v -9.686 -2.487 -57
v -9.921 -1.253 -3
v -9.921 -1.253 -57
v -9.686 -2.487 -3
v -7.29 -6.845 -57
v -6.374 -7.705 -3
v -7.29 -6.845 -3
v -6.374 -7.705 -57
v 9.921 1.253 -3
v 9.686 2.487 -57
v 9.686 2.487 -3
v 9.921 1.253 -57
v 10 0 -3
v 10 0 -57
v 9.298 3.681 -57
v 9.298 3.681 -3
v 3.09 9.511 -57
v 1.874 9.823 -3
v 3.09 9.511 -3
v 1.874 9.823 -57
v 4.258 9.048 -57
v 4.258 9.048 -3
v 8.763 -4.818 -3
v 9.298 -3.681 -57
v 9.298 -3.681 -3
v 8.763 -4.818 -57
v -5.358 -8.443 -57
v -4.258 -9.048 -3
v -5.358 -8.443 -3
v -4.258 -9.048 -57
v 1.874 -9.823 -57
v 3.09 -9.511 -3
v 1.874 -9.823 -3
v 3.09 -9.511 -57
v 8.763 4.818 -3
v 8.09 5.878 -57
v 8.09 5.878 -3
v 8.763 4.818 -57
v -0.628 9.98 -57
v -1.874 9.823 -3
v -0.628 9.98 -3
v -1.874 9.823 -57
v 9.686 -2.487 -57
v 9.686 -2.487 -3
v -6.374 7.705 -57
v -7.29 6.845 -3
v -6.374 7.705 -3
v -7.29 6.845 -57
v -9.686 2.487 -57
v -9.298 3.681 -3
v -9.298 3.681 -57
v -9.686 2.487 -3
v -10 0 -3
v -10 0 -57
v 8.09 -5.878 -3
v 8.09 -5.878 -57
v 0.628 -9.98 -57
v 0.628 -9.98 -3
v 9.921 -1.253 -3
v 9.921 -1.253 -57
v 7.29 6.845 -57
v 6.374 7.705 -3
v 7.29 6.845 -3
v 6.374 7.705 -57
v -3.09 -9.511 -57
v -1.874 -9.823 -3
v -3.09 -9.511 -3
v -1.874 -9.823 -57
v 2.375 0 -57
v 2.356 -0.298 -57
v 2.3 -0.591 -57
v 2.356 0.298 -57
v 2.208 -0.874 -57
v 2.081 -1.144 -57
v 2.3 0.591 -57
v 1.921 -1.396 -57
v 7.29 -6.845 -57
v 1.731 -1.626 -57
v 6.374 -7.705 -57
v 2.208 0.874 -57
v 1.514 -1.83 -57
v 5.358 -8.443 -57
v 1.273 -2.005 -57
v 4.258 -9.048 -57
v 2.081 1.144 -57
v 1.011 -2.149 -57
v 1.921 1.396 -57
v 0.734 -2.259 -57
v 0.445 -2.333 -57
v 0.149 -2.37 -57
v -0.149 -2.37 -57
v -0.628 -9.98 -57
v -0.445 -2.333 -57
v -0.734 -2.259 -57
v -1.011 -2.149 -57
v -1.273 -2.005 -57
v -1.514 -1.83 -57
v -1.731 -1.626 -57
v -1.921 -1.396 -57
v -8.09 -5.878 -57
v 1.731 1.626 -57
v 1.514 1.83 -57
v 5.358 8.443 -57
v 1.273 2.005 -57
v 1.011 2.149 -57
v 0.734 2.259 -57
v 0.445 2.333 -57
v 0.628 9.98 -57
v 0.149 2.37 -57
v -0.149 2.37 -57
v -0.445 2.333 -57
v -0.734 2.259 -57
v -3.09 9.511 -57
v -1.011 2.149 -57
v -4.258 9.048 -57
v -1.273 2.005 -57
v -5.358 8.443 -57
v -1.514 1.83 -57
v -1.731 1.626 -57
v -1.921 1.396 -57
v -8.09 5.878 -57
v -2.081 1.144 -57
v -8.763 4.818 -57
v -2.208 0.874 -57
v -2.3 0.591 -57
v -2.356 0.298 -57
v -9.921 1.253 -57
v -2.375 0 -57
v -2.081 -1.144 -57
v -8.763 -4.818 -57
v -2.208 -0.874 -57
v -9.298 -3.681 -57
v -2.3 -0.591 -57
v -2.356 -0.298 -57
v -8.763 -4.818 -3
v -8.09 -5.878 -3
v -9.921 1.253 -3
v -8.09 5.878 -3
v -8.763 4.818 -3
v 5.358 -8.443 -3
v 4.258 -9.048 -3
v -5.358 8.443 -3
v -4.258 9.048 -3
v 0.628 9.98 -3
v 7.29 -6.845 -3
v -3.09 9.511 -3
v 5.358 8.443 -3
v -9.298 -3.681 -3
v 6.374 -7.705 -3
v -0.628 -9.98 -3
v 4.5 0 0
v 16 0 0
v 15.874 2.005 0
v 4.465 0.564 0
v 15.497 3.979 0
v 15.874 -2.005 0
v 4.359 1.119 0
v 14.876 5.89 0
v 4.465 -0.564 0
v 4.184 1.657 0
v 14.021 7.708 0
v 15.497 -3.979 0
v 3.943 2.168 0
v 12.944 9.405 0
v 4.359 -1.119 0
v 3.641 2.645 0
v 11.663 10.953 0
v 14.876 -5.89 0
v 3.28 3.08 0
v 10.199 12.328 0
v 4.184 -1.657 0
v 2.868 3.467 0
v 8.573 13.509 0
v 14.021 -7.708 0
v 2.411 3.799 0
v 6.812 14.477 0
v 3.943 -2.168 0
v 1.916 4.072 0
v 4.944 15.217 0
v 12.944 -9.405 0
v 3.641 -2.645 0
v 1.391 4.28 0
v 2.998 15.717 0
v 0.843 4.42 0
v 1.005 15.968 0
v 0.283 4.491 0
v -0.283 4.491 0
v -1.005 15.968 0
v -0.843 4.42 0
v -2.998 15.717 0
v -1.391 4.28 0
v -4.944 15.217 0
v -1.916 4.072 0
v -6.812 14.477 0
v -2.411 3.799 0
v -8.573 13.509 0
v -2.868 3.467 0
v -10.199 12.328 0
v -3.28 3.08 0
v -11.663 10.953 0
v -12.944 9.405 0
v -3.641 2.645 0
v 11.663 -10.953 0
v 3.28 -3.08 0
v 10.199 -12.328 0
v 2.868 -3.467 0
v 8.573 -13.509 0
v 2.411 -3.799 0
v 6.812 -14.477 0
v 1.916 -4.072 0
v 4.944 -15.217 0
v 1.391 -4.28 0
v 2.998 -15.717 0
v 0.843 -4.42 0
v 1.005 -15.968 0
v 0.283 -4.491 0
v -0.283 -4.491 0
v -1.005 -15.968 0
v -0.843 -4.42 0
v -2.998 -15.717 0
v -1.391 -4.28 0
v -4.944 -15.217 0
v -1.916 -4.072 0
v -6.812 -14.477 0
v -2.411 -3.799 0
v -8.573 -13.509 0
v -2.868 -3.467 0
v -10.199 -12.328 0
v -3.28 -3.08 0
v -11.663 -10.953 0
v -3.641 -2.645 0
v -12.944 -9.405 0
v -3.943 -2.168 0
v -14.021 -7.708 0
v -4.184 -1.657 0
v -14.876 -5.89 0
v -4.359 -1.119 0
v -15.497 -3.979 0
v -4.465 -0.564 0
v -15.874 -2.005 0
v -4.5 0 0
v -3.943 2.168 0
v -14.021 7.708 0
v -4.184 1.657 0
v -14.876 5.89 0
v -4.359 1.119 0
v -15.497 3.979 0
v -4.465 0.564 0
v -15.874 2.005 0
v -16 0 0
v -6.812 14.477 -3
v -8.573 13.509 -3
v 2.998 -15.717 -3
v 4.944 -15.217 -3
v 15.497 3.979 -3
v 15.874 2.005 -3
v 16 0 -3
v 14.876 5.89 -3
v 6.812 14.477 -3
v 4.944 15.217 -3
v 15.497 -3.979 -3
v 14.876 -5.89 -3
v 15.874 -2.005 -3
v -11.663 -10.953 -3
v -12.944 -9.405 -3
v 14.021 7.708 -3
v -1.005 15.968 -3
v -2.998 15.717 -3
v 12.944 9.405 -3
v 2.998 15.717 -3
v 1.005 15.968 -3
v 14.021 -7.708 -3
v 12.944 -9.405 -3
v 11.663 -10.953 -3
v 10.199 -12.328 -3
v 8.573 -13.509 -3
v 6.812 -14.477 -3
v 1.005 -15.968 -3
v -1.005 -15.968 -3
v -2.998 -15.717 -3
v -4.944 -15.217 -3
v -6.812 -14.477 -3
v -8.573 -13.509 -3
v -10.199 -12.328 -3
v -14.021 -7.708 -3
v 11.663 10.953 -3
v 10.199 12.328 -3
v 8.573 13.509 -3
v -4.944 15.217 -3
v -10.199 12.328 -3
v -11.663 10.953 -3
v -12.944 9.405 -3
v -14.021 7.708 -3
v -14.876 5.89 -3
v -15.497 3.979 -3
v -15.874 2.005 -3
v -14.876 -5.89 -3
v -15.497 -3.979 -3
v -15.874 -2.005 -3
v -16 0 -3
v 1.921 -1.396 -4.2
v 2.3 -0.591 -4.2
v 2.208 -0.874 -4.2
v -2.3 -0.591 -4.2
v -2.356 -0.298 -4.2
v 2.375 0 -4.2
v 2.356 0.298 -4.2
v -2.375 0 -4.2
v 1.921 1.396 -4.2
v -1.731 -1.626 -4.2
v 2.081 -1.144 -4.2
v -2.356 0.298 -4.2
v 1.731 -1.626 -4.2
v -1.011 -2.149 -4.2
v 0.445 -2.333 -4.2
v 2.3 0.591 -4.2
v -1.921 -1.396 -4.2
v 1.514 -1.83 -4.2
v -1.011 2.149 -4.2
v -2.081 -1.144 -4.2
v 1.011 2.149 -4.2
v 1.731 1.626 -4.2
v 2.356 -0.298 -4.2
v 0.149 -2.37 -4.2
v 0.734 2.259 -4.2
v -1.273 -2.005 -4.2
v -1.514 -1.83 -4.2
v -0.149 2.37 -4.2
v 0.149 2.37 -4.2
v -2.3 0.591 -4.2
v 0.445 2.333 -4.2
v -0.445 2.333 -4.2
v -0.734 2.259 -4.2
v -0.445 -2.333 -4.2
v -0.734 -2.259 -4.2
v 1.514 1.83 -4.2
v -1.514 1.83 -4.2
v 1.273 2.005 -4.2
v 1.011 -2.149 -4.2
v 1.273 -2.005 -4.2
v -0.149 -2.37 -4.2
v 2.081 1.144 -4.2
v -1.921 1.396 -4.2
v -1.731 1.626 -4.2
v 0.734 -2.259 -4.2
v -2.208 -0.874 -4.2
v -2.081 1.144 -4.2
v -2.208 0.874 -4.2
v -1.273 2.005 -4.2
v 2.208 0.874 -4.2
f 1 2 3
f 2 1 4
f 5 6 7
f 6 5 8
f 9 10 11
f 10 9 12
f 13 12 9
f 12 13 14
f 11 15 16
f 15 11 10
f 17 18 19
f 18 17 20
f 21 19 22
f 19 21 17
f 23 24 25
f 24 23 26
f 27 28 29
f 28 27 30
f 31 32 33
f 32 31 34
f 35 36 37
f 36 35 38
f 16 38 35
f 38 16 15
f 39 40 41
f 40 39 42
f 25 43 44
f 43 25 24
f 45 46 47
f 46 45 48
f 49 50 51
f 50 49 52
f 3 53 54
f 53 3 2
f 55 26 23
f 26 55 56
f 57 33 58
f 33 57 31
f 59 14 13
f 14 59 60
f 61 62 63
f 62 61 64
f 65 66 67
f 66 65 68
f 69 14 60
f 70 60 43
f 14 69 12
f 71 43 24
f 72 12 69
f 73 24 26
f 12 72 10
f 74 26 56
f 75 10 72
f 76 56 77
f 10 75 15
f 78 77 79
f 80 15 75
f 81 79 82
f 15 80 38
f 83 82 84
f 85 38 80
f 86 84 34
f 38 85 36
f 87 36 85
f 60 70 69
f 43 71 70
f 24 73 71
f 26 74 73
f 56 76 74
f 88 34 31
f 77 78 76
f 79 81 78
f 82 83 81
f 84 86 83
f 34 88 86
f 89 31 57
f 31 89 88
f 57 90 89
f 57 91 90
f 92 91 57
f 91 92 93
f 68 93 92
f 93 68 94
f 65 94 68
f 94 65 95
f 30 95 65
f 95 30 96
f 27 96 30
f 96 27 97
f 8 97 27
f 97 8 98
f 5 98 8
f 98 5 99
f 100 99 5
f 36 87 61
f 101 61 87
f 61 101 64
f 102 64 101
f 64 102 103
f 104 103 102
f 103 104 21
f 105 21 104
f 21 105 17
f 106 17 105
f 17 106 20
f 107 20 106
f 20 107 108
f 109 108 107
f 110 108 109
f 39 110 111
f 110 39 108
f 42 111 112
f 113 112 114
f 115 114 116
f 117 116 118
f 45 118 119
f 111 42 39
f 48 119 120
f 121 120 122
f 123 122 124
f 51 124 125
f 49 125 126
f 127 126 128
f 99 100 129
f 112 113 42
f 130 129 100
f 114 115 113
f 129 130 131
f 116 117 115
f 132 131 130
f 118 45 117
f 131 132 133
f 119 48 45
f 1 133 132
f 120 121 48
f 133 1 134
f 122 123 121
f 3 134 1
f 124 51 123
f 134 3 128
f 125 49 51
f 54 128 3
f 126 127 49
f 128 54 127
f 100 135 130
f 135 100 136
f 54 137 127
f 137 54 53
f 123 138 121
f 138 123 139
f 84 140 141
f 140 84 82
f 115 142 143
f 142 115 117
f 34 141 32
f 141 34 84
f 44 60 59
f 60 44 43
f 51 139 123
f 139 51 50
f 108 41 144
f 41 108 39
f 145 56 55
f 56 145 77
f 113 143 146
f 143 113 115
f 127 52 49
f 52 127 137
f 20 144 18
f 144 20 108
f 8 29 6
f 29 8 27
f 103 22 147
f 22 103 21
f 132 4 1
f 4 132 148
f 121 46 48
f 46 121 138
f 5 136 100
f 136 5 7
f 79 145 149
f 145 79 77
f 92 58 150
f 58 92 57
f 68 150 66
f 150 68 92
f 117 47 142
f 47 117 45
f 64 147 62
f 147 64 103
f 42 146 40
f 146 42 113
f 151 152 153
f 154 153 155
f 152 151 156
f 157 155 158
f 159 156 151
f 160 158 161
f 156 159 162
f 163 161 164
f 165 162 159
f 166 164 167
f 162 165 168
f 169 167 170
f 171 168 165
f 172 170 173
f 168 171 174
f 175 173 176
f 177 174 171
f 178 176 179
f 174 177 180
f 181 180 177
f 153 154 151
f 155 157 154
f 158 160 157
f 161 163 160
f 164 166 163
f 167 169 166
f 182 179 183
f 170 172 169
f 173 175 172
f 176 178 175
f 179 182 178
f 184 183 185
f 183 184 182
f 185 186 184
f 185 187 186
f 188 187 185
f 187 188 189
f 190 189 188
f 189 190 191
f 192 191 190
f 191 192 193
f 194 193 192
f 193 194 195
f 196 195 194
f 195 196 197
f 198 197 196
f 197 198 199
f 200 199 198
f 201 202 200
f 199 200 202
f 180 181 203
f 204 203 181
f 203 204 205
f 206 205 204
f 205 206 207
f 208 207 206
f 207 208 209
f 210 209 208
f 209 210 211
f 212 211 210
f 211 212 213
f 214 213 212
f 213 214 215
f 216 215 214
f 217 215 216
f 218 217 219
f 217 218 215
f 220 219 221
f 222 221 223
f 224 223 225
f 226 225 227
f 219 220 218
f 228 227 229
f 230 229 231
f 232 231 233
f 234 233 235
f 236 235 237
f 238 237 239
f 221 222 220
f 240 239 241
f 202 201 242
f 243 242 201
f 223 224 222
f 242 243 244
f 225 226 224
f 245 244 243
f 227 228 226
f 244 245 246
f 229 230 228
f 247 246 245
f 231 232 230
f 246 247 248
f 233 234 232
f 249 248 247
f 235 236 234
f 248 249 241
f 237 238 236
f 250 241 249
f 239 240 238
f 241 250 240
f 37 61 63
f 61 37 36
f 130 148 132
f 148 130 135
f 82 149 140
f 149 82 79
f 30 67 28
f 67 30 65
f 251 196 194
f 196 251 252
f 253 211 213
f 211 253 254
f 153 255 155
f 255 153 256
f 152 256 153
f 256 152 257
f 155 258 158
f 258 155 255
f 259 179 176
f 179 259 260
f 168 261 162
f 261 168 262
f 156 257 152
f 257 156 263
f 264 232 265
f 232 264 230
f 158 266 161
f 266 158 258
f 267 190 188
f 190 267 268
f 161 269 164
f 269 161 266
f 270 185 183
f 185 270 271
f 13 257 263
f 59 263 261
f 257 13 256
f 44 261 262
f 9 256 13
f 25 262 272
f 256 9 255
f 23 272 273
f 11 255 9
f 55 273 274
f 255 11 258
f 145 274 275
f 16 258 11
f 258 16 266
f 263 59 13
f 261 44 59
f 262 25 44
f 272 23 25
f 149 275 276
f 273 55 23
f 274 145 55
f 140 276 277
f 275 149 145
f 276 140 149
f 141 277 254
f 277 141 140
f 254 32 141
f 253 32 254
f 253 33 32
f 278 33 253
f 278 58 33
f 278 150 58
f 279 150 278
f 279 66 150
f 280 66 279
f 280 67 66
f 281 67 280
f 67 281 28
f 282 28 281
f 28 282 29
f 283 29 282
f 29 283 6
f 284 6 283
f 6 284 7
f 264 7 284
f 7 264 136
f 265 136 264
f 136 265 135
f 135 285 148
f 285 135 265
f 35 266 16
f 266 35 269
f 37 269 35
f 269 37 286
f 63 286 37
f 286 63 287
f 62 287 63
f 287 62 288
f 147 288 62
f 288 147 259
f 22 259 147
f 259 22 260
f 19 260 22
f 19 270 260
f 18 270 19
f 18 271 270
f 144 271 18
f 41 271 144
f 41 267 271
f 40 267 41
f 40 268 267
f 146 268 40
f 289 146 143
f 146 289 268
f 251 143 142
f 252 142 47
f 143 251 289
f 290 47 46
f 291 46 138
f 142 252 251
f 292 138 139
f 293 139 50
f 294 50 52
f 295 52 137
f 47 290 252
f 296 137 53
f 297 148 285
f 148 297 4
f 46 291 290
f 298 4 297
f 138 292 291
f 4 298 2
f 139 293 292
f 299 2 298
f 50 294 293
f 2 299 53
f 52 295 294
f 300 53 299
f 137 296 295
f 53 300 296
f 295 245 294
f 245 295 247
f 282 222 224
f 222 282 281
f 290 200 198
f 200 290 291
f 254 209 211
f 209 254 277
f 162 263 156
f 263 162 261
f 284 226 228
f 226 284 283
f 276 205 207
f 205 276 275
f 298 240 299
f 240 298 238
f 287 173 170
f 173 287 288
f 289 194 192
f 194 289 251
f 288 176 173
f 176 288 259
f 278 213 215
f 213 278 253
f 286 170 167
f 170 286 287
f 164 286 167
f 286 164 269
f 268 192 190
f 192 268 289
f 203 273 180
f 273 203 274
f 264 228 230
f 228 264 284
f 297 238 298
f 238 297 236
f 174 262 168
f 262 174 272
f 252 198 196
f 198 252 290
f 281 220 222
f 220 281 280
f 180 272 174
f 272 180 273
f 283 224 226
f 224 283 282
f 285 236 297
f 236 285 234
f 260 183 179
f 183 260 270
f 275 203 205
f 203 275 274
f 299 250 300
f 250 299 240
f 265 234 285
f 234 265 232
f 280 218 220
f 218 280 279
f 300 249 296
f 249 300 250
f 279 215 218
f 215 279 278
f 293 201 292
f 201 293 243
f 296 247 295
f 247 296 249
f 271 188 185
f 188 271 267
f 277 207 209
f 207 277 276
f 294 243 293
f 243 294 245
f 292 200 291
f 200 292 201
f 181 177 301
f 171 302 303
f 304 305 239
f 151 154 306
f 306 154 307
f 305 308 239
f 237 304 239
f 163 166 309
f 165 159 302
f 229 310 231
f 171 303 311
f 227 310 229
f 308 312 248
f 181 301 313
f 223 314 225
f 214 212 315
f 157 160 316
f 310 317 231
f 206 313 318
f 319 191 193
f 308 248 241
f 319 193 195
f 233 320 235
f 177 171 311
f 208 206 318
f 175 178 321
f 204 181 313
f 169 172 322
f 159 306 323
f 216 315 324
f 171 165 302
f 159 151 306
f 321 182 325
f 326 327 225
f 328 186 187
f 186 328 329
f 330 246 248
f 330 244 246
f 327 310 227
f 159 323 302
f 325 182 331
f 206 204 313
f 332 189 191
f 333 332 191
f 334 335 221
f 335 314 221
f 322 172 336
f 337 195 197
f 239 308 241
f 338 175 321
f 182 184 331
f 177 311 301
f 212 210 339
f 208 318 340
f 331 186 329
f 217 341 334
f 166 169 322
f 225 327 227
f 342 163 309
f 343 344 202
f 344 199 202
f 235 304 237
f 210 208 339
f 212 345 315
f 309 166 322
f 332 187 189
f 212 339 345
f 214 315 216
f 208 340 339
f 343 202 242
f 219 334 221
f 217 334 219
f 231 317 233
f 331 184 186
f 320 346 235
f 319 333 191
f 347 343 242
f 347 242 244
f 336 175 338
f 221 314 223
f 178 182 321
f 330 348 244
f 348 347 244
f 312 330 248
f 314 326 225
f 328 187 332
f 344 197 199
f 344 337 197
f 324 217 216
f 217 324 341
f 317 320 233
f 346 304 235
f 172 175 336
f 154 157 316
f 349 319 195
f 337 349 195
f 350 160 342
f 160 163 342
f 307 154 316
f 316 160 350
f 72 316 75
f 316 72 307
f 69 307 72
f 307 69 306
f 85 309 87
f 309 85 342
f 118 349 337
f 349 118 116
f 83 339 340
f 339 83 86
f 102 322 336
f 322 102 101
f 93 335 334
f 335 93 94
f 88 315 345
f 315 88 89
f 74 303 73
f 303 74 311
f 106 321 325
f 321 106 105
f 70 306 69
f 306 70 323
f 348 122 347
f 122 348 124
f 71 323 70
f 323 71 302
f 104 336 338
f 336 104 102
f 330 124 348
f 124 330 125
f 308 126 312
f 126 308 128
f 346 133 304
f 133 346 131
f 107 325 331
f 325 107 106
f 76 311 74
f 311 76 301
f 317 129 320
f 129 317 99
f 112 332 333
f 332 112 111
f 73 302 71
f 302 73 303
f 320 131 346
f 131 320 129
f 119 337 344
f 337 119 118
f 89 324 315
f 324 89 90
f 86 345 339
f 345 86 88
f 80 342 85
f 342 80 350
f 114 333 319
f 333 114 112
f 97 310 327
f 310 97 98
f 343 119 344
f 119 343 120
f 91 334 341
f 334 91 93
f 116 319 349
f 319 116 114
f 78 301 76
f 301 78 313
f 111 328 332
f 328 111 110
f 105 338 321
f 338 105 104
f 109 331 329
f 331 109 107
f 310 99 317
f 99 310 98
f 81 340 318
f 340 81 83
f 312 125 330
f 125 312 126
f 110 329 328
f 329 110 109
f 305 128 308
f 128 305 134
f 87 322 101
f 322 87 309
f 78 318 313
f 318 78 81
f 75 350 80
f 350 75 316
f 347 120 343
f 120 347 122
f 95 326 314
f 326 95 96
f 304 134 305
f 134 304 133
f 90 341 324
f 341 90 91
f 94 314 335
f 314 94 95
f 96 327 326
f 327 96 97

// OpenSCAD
$fn = 50;


difference() {
	union() {
		translate(v = [0, 0, -57.0000000000]) {
			cylinder(h = 57, r = 10.0000000000);
		}
		translate(v = [0, 0, -3.0000000000]) {
			cylinder(h = 3, r = 16.0000000000);
		}
	}
	union() {
		translate(v = [0, 0, 0]) {
			rotate(a = [0, 0, 0]) {
				difference() {
					union() {
						#translate(v = [0, 0, -57.0000000000]) {
							cylinder(h = 57, r = 2.2500000000);
						}
						#translate(v = [0, 0, -4.2000000000]) {
							cylinder(h = 4.2000000000, r = 10.0000000000, r1 = 2.3750000000, r2 = 4.5000000000);
						}
						#translate(v = [0, 0, -57.0000000000]) {
							cylinder(h = 57, r = 2.3750000000);
						}
						#translate(v = [0, 0, -57.0000000000]) {
							cylinder(h = 57, r = 2.2500000000);
						}
					}
					union();
				}
			}
		}
	}
}
